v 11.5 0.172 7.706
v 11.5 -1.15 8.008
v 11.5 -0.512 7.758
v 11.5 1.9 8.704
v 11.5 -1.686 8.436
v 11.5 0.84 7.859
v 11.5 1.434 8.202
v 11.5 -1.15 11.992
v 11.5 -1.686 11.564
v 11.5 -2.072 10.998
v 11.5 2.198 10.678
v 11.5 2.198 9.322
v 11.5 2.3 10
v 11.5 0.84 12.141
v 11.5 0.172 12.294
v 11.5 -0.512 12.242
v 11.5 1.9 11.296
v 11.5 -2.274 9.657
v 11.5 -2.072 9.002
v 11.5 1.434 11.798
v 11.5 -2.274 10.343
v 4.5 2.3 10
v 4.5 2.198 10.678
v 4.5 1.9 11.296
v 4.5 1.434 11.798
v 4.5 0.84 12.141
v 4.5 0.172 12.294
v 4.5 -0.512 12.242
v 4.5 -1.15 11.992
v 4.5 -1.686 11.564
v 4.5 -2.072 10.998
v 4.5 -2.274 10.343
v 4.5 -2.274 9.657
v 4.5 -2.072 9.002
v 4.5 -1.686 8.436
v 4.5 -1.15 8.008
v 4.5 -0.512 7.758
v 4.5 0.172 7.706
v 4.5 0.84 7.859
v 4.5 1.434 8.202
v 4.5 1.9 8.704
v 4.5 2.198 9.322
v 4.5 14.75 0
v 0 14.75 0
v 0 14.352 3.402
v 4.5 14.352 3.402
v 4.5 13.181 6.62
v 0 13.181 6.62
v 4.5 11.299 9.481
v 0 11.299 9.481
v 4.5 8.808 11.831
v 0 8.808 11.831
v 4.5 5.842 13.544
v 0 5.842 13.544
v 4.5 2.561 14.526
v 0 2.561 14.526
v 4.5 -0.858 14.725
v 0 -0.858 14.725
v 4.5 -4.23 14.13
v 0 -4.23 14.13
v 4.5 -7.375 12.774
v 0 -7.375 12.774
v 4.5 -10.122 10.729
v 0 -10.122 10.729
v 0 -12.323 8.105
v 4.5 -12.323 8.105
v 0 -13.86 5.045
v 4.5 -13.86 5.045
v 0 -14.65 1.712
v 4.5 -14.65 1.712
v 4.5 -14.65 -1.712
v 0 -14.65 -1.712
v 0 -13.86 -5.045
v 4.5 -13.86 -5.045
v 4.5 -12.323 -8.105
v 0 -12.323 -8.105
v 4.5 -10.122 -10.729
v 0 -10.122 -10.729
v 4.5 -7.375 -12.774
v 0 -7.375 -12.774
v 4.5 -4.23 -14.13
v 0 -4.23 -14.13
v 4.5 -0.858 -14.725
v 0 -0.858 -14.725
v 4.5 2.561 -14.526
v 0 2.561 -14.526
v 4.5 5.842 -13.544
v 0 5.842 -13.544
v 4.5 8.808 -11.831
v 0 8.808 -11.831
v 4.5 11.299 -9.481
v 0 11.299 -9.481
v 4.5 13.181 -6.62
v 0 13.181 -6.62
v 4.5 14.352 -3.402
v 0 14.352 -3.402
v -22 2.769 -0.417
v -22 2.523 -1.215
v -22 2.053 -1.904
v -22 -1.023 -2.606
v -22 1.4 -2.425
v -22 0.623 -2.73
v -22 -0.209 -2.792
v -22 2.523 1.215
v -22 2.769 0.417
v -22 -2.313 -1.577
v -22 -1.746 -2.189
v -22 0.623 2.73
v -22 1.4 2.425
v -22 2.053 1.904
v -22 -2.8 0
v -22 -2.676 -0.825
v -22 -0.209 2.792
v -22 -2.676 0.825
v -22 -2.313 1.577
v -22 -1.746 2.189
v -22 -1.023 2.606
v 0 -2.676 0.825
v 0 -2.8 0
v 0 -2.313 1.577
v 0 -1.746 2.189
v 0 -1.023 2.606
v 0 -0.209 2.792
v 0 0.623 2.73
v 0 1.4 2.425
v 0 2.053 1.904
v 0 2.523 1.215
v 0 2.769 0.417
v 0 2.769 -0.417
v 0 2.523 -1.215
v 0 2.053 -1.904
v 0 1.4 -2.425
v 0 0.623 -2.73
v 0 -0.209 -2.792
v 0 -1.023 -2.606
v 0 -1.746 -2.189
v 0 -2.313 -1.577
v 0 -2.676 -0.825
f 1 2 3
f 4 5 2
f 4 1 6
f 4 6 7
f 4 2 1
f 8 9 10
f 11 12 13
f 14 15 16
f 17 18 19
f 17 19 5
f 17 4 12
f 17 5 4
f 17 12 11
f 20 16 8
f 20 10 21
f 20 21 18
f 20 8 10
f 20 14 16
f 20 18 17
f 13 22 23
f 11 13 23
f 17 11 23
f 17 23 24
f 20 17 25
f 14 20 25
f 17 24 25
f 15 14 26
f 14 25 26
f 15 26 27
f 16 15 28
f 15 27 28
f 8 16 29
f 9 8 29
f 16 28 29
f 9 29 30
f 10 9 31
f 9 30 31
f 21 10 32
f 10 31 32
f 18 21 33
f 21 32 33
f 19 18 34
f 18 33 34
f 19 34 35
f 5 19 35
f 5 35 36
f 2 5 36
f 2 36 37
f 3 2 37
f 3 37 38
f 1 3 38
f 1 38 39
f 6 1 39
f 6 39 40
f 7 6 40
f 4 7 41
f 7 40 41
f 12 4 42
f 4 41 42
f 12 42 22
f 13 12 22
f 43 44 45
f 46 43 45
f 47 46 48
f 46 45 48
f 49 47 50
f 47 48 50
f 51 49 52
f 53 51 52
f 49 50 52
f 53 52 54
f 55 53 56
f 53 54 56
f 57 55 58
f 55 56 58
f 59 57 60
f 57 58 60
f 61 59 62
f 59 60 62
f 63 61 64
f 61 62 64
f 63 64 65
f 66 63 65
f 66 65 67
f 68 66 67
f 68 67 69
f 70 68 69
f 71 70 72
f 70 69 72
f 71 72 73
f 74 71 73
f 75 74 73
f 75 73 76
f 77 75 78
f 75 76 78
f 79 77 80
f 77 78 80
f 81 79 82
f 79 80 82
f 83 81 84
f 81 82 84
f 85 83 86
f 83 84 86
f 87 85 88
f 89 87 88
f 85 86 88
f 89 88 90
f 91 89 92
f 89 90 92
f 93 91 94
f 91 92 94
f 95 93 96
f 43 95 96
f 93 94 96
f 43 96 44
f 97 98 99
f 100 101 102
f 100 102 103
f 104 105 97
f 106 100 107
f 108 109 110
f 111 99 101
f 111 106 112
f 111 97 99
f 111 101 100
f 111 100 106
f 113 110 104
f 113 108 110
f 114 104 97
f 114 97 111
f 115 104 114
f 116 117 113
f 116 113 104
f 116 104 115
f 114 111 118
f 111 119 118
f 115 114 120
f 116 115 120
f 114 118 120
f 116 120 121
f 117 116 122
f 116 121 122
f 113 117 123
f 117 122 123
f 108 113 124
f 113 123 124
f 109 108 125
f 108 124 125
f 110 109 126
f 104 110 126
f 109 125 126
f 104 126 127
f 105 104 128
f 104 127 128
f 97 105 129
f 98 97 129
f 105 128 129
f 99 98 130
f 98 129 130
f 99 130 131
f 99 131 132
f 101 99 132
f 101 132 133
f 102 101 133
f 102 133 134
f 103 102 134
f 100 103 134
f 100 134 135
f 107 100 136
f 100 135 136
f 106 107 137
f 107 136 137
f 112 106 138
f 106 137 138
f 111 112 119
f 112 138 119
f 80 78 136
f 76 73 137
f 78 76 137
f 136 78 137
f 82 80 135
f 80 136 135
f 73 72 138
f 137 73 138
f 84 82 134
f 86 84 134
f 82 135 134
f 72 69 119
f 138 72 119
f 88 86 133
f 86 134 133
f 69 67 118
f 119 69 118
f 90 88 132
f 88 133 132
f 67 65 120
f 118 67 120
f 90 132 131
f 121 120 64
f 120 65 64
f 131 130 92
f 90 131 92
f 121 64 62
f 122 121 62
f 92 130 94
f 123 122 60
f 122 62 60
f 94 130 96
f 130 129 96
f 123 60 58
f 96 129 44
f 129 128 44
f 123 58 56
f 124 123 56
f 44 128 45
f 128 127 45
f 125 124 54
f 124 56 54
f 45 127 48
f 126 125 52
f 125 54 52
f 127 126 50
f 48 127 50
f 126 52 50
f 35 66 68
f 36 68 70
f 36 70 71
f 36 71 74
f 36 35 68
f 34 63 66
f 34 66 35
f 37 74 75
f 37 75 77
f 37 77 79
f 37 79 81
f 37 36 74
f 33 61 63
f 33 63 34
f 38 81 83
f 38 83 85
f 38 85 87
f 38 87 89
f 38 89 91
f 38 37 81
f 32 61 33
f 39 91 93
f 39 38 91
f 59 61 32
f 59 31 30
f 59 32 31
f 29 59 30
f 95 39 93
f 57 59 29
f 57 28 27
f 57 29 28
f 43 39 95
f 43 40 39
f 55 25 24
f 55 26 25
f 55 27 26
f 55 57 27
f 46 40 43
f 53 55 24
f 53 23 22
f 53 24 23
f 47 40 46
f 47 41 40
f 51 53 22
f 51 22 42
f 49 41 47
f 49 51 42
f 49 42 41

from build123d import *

# Parameters (mm, degrees)
F0_R      = 14.75
F1_DEPTH  = 4.5
F2_R      = 2.8
F3_DEPTH  = 17
F4_R      = 2.3
F5_DEPTH  = 7
F3_FACE_R = 2.8
F6_DEPTH  = 5


with BuildPart() as f1:
    # F0 (on Right) → F1 (new body)
    with BuildSketch(Plane.YZ):
        Circle(F0_R)
    extrude(amount=F1_DEPTH)

    # F2 (on face) → F3 (join)
    with BuildSketch(Plane(origin=(0, 0, 0), x_dir=(0, -1, 0), z_dir=(-1, 0, 0))):
        Circle(F2_R)
    extrude(amount=F3_DEPTH)

    # F4 (on face) → F5 (join)
    with BuildSketch(Plane.YZ.offset(4.5)):
        with Locations((0, 10)):
            Circle(F4_R)
    extrude(amount=F5_DEPTH)

    # F3_face (on face) → F6 (join)
    with BuildSketch(Plane(origin=(-17, 0, 0), x_dir=(0, -1, 0), z_dir=(-1, 0, 0))):
        Circle(F3_FACE_R)
    extrude(amount=F6_DEPTH)


solid = f1.part
